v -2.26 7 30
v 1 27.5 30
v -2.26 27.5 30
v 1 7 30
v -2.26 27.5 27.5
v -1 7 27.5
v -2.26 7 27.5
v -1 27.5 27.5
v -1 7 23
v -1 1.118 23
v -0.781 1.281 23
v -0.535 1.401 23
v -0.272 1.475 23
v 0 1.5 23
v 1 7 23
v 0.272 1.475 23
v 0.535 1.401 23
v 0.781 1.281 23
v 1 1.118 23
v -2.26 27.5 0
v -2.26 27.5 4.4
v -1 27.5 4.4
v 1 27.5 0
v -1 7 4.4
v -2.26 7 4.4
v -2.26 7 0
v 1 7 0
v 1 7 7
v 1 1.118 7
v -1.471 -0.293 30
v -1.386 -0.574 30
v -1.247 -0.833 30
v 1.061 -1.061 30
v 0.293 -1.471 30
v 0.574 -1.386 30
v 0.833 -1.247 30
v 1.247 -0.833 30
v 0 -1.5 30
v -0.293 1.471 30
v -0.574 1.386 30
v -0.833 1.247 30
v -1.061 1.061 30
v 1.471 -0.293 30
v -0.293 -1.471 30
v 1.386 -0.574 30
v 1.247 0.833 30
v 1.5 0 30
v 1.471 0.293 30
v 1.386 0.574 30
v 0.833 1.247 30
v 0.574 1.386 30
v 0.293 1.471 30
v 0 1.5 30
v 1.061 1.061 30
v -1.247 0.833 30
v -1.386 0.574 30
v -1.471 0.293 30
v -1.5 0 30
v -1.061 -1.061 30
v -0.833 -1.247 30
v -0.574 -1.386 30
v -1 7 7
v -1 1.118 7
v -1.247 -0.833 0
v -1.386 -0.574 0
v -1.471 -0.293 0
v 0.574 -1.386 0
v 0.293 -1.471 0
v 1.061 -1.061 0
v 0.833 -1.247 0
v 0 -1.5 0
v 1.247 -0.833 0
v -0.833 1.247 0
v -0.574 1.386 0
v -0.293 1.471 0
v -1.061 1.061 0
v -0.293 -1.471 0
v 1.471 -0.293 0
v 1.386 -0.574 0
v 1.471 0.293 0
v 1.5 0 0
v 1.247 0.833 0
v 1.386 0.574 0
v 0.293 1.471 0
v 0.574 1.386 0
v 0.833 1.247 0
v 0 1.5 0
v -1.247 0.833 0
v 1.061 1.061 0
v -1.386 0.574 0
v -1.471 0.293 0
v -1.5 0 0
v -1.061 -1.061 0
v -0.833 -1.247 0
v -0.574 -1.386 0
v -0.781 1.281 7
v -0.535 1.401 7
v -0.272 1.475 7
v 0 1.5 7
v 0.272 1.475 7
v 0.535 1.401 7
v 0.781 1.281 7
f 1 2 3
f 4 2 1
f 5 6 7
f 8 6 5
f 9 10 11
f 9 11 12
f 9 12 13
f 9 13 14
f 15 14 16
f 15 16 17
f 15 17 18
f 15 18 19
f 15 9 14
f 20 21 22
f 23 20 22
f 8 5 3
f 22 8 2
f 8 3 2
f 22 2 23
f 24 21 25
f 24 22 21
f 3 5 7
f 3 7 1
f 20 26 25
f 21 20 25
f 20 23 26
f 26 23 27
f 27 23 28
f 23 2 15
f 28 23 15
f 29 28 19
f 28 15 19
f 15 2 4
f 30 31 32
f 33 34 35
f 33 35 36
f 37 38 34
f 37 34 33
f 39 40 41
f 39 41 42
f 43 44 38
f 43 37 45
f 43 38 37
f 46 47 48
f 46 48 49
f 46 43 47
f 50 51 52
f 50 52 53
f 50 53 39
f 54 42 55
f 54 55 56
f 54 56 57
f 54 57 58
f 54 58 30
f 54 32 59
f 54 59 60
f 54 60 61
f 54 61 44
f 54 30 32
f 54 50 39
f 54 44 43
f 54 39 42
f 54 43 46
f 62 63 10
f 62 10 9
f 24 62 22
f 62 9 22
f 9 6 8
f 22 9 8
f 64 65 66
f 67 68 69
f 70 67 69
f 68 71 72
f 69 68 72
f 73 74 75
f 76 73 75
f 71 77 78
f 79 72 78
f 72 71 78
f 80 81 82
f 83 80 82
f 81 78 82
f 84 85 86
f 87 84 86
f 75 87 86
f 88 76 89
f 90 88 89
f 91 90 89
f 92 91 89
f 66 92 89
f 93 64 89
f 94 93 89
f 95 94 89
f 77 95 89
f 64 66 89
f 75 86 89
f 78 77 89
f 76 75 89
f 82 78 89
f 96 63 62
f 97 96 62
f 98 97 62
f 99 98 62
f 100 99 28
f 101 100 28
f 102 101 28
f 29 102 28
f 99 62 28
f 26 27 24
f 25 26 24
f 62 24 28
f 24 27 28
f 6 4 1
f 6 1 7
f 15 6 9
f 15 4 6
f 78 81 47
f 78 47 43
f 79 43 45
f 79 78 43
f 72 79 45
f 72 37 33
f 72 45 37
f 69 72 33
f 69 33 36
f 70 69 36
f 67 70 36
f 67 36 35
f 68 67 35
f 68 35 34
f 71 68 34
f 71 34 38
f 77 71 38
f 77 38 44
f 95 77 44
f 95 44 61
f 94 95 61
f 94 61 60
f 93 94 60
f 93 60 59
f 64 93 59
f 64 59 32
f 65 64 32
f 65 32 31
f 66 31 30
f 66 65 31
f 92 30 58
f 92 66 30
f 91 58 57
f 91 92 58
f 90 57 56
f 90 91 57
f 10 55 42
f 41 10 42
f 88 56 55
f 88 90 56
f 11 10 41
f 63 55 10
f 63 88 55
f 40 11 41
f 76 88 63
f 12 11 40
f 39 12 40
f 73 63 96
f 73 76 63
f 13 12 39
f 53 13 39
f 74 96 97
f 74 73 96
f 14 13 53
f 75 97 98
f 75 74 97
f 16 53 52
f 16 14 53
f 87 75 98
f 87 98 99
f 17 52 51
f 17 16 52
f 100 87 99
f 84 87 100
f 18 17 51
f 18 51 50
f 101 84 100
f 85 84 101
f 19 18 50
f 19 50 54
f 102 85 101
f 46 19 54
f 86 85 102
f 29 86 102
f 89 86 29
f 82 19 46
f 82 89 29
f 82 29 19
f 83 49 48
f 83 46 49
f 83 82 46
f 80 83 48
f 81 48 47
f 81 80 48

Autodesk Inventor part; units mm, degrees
ref_plane "YZ Plane" through (0, 0, 0) normal (1, 0, 0) x (0, 1, 0)
ref_plane "XZ Plane" through (0, 0, 0) normal (0, 1, 0) x (-1, 0, 0)
ref_plane "XY Plane" through (0, 0, 0) normal (0, 0, 1) x (1, 0, 0)
sketch "Sketch1" plane through (0, 0, 0) normal (0, 0, 1) x (1, 0, 0)
  circle A0 centre (0, 0) radius 1.5
  dimension "d0" = 3
extrude "Extrusion1" add sketch "Sketch1" along normal blind 30
ref_plane "Work Plane1" through (0, 0, 23) normal (0, 0, 1) x (1, 0, 0)
ref_plane "Work Plane2" through (0, 0, 7) normal (0, 0, -1) x (-1, 0, 0)
sketch "Sketch2" plane through (0, 0, 23) normal (0, 0, 1) x (1, 0, 0)
  circle A0 centre (0, 0) radius 1.5 projected
  line L0 (1, 0) -> (-1, 0)
  line L1 (-1, 0) -> (-1, 27.5)
  line L2 (-1, 27.5) -> (1, 27.5)
  line L3 (1, 27.5) -> (1, 0)
  dimension "d7" = 27.5
  dimension "d13" = 1
extrude "Extrusion2" add sketch "Sketch2" against normal up to surface (16 mm away) contours L3 L0 L1 A0 | A0 L1 L2 L3 picked at (0, 0.5)
sketch "Sketch3" plane through (1, 1.118, 23) normal (1, 0, 0) x (0, 0, -1)
  line L0 (16, 0) -> (16, 26.382) projected
  line L1 (0, 26.382) -> (16, 26.382) projected
  line L2 (0, 26.382) -> (0, 0) projected
  line L3 (16, 0) -> (0, 0) projected
  line L4 (0, 26.382) -> (-7, 26.382)
  line L5 (-7, 26.382) -> (-7, 5.882)
  line L6 (-7, 5.882) -> (0, 5.882)
  line L7 (0, 5.882) -> (0, 26.382)
  line L8 (16, 0) -> (16, 26.382) projected
  line L9 (16, 26.382) -> (23, 26.382)
  line L10 (23, 26.382) -> (23, 5.882)
  line L11 (23, 5.882) -> (16, 5.882)
  line L12 (16, 5.882) -> (16, 26.382)
  line L13 (23, -2.618) -> (23, 0.382) projected
  line L14 (-7, 0.382) -> (-7, -2.618) projected
  line L15 (0, 0) -> (16, 0) projected
  line L16 (16, 0) -> (16, 0) projected
  line L17 (16, 0) -> (0, 0) projected
  line L18 (0, 0) -> (0, 0) projected
  point P0 (23, -1.118)
  point P1 (19.5, 5.882)
  point P2 (-3.5, 5.882)
  point P3 (23, -1.118)
  point P4 (23, 16.132)
  point P5 (-7, 16.132)
  point P6 (-7, -1.118)
  dimension "d10" = 5.5
extrude "Extrusion3" add sketch "Sketch3" against normal up to surface (2 mm away) contours L0 L9 L10 L11 | L6 L5 L4 L2
sketch "Sketch5" plane through (-1, 1.118, 7) normal (-1, 0, 0) x (0, 0, 1)
  line L0 (16, 0) -> (0, 0) projected
  line L1 (16, 0) -> (16, 5.882) projected
  line L2 (23, 5.882) -> (16, 5.882) projected
  line L3 (23, 26.382) -> (23, 5.882) projected
  line L4 (23, 26.382) -> (-7, 26.382) projected
  line L5 (-7, 5.882) -> (-7, 26.382) projected
  line L6 (0, 5.882) -> (-7, 5.882) projected
  line L7 (0, 5.882) -> (0, 0) projected
  line L8 (23, 5.882) -> (16, 5.882) projected
  line L9 (23, 26.382) -> (-7, 26.382) projected
  line L10 (23, 5.882) -> (20.5, 5.882)
  line L11 (20.5, 5.882) -> (20.5, 26.382)
  line L12 (20.5, 26.382) -> (23, 26.382)
  line L13 (23, 26.382) -> (23, 5.882)
  line L14 (0, 5.882) -> (-7, 5.882) projected
  line L15 (-7, 26.382) -> (-2.6, 26.382)
  line L16 (-2.6, 26.382) -> (-2.6, 5.882)
  line L17 (-2.6, 5.882) -> (-7, 5.882)
  line L18 (-7, 5.882) -> (-7, 26.382)
  point P0 (-7, -1.118)
  dimension "d16" = 2.5
  dimension "d17" = 4.4
extrude "Extrusion5" add sketch "Sketch5" along normal blind 1.26 contours L11 L4 L3 L2 | L6 L5 L4 L16
properties part number "gpsDoor"
